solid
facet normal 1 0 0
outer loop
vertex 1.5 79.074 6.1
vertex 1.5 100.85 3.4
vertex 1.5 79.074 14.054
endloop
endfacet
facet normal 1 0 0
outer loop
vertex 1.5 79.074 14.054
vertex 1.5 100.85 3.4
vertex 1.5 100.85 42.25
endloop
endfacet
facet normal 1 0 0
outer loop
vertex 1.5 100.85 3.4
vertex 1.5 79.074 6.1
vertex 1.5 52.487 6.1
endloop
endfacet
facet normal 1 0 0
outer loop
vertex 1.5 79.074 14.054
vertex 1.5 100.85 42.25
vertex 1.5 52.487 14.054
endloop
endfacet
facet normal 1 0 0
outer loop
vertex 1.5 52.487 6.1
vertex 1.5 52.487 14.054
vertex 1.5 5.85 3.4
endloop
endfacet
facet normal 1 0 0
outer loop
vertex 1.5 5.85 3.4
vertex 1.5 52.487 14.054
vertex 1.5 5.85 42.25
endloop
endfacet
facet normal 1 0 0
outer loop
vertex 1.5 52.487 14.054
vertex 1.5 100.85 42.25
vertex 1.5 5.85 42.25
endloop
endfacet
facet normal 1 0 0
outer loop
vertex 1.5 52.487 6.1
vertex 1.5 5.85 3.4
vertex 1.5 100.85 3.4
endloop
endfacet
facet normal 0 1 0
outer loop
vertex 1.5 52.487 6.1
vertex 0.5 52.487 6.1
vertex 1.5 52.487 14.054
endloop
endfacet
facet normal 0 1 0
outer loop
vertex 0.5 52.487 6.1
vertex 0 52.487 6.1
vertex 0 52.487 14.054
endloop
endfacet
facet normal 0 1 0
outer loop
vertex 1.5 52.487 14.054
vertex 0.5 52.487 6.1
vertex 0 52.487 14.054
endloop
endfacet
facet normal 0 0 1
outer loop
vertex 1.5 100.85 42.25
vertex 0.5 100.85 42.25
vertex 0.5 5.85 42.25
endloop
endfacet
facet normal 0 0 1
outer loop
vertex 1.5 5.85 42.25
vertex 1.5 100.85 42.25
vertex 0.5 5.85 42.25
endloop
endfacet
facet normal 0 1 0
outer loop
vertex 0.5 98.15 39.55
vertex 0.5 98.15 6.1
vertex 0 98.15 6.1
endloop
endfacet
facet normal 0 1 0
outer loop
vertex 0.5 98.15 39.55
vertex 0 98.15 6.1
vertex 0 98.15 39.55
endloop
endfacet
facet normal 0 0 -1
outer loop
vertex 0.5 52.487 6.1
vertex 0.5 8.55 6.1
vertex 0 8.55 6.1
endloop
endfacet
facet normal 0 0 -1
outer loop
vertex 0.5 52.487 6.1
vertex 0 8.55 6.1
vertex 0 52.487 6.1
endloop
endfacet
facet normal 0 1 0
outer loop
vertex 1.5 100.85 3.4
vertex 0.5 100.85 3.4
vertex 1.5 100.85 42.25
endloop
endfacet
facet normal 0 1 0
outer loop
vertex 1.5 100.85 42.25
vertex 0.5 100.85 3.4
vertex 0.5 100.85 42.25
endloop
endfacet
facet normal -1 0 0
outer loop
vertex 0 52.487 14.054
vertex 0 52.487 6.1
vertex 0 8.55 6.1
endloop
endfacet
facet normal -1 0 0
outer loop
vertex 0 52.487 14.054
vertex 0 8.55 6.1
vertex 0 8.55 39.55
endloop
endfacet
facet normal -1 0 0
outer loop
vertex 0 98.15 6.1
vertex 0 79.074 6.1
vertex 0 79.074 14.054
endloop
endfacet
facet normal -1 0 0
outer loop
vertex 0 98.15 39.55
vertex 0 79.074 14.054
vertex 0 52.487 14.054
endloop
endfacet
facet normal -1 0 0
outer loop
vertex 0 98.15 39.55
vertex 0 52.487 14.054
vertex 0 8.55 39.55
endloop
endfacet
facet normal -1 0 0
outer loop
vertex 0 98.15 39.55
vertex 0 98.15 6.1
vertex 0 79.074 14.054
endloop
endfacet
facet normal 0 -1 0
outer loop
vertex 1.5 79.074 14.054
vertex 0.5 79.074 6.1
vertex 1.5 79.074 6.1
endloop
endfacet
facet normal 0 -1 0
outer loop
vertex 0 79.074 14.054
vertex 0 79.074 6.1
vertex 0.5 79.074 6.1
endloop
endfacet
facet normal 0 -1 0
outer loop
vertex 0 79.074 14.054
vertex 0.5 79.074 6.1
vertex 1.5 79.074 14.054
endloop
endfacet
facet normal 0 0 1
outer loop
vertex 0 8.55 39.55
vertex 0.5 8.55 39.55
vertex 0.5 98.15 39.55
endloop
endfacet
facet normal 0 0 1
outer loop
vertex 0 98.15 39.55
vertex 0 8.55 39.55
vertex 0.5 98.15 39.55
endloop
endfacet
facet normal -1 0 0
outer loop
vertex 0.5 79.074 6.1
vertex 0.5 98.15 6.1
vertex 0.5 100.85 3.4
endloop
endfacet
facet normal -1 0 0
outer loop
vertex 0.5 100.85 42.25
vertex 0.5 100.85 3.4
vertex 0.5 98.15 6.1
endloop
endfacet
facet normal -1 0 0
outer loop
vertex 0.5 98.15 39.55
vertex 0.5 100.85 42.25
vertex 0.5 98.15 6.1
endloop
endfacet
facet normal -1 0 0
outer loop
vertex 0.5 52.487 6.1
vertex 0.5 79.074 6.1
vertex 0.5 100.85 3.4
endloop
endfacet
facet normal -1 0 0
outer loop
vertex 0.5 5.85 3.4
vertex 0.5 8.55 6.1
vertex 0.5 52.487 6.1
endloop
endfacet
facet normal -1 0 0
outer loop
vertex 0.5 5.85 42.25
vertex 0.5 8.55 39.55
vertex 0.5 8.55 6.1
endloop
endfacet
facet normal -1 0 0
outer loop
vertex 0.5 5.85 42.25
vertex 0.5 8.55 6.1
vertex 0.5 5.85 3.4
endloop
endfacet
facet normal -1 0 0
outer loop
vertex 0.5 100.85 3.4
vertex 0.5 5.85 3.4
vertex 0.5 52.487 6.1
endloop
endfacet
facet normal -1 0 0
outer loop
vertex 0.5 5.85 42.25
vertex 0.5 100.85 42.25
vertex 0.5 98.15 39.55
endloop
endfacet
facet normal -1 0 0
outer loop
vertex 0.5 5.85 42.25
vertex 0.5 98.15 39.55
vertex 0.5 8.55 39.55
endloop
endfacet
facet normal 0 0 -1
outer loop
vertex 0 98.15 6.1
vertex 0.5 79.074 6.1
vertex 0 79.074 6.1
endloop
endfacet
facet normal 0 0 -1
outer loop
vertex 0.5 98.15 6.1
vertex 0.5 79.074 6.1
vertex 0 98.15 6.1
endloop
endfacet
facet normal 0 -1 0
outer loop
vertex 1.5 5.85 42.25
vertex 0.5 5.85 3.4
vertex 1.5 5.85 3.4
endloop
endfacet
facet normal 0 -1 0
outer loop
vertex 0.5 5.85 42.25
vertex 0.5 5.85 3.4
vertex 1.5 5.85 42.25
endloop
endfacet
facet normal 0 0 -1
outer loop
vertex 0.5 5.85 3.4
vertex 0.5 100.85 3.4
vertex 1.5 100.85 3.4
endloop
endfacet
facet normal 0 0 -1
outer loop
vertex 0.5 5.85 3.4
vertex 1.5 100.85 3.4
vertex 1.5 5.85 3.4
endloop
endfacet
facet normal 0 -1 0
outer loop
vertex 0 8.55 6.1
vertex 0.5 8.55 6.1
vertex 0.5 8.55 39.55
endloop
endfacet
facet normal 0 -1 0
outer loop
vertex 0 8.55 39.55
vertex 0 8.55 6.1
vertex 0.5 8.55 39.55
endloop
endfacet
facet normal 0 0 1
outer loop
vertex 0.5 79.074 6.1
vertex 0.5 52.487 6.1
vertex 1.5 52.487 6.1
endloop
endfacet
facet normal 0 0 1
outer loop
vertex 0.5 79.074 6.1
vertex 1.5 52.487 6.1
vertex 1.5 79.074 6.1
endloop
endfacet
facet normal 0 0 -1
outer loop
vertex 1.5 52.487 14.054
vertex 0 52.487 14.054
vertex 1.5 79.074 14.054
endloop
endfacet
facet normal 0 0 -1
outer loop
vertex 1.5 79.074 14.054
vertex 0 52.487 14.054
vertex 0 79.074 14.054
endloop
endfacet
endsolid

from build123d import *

# Parameters (mm, degrees)
SKETCH_1_W          = 95
SKETCH_1_H          = 38.85
EXTRUDE_1_DEPTH     = 1
SKETCH_2_W          = 33.45
SKETCH_2_H          = 89.6
EXTRUDE_2_DEPTH     = 0.5
SKETCH_3_W          = 7.954176302
SKETCH_3_H          = 26.586882205
CUT_EXTRUDE_1_DEPTH = 2


with BuildPart() as part:
    # Эскиз1 → Бобышка-Вытянуть1 (new body)
    with BuildSketch(Plane(origin=(0.5, 0, 0), x_dir=(0, -1, 0), z_dir=(-1, 0, 0))):
        with Locations((-53.35, 22.825)):
            Rectangle(SKETCH_1_W, SKETCH_1_H)
    extrude(amount=-EXTRUDE_1_DEPTH)

    # Эскиз2 → Бобышка-Вытянуть2 (add)
    with BuildSketch(Plane.ZY.offset(-0.5)):
        with Locations((22.825, 53.35)):
            Rectangle(SKETCH_2_W, SKETCH_2_H)
    extrude(amount=EXTRUDE_2_DEPTH)

    # Эскиз3 → Вырез-Вытянуть1 (cut)
    with BuildSketch(Plane.ZY):
        with Locations((10.077088151, 65.780778583)):
            Rectangle(SKETCH_3_W, SKETCH_3_H)
    extrude(amount=-CUT_EXTRUDE_1_DEPTH, mode=Mode.SUBTRACT)


solid = part.part
